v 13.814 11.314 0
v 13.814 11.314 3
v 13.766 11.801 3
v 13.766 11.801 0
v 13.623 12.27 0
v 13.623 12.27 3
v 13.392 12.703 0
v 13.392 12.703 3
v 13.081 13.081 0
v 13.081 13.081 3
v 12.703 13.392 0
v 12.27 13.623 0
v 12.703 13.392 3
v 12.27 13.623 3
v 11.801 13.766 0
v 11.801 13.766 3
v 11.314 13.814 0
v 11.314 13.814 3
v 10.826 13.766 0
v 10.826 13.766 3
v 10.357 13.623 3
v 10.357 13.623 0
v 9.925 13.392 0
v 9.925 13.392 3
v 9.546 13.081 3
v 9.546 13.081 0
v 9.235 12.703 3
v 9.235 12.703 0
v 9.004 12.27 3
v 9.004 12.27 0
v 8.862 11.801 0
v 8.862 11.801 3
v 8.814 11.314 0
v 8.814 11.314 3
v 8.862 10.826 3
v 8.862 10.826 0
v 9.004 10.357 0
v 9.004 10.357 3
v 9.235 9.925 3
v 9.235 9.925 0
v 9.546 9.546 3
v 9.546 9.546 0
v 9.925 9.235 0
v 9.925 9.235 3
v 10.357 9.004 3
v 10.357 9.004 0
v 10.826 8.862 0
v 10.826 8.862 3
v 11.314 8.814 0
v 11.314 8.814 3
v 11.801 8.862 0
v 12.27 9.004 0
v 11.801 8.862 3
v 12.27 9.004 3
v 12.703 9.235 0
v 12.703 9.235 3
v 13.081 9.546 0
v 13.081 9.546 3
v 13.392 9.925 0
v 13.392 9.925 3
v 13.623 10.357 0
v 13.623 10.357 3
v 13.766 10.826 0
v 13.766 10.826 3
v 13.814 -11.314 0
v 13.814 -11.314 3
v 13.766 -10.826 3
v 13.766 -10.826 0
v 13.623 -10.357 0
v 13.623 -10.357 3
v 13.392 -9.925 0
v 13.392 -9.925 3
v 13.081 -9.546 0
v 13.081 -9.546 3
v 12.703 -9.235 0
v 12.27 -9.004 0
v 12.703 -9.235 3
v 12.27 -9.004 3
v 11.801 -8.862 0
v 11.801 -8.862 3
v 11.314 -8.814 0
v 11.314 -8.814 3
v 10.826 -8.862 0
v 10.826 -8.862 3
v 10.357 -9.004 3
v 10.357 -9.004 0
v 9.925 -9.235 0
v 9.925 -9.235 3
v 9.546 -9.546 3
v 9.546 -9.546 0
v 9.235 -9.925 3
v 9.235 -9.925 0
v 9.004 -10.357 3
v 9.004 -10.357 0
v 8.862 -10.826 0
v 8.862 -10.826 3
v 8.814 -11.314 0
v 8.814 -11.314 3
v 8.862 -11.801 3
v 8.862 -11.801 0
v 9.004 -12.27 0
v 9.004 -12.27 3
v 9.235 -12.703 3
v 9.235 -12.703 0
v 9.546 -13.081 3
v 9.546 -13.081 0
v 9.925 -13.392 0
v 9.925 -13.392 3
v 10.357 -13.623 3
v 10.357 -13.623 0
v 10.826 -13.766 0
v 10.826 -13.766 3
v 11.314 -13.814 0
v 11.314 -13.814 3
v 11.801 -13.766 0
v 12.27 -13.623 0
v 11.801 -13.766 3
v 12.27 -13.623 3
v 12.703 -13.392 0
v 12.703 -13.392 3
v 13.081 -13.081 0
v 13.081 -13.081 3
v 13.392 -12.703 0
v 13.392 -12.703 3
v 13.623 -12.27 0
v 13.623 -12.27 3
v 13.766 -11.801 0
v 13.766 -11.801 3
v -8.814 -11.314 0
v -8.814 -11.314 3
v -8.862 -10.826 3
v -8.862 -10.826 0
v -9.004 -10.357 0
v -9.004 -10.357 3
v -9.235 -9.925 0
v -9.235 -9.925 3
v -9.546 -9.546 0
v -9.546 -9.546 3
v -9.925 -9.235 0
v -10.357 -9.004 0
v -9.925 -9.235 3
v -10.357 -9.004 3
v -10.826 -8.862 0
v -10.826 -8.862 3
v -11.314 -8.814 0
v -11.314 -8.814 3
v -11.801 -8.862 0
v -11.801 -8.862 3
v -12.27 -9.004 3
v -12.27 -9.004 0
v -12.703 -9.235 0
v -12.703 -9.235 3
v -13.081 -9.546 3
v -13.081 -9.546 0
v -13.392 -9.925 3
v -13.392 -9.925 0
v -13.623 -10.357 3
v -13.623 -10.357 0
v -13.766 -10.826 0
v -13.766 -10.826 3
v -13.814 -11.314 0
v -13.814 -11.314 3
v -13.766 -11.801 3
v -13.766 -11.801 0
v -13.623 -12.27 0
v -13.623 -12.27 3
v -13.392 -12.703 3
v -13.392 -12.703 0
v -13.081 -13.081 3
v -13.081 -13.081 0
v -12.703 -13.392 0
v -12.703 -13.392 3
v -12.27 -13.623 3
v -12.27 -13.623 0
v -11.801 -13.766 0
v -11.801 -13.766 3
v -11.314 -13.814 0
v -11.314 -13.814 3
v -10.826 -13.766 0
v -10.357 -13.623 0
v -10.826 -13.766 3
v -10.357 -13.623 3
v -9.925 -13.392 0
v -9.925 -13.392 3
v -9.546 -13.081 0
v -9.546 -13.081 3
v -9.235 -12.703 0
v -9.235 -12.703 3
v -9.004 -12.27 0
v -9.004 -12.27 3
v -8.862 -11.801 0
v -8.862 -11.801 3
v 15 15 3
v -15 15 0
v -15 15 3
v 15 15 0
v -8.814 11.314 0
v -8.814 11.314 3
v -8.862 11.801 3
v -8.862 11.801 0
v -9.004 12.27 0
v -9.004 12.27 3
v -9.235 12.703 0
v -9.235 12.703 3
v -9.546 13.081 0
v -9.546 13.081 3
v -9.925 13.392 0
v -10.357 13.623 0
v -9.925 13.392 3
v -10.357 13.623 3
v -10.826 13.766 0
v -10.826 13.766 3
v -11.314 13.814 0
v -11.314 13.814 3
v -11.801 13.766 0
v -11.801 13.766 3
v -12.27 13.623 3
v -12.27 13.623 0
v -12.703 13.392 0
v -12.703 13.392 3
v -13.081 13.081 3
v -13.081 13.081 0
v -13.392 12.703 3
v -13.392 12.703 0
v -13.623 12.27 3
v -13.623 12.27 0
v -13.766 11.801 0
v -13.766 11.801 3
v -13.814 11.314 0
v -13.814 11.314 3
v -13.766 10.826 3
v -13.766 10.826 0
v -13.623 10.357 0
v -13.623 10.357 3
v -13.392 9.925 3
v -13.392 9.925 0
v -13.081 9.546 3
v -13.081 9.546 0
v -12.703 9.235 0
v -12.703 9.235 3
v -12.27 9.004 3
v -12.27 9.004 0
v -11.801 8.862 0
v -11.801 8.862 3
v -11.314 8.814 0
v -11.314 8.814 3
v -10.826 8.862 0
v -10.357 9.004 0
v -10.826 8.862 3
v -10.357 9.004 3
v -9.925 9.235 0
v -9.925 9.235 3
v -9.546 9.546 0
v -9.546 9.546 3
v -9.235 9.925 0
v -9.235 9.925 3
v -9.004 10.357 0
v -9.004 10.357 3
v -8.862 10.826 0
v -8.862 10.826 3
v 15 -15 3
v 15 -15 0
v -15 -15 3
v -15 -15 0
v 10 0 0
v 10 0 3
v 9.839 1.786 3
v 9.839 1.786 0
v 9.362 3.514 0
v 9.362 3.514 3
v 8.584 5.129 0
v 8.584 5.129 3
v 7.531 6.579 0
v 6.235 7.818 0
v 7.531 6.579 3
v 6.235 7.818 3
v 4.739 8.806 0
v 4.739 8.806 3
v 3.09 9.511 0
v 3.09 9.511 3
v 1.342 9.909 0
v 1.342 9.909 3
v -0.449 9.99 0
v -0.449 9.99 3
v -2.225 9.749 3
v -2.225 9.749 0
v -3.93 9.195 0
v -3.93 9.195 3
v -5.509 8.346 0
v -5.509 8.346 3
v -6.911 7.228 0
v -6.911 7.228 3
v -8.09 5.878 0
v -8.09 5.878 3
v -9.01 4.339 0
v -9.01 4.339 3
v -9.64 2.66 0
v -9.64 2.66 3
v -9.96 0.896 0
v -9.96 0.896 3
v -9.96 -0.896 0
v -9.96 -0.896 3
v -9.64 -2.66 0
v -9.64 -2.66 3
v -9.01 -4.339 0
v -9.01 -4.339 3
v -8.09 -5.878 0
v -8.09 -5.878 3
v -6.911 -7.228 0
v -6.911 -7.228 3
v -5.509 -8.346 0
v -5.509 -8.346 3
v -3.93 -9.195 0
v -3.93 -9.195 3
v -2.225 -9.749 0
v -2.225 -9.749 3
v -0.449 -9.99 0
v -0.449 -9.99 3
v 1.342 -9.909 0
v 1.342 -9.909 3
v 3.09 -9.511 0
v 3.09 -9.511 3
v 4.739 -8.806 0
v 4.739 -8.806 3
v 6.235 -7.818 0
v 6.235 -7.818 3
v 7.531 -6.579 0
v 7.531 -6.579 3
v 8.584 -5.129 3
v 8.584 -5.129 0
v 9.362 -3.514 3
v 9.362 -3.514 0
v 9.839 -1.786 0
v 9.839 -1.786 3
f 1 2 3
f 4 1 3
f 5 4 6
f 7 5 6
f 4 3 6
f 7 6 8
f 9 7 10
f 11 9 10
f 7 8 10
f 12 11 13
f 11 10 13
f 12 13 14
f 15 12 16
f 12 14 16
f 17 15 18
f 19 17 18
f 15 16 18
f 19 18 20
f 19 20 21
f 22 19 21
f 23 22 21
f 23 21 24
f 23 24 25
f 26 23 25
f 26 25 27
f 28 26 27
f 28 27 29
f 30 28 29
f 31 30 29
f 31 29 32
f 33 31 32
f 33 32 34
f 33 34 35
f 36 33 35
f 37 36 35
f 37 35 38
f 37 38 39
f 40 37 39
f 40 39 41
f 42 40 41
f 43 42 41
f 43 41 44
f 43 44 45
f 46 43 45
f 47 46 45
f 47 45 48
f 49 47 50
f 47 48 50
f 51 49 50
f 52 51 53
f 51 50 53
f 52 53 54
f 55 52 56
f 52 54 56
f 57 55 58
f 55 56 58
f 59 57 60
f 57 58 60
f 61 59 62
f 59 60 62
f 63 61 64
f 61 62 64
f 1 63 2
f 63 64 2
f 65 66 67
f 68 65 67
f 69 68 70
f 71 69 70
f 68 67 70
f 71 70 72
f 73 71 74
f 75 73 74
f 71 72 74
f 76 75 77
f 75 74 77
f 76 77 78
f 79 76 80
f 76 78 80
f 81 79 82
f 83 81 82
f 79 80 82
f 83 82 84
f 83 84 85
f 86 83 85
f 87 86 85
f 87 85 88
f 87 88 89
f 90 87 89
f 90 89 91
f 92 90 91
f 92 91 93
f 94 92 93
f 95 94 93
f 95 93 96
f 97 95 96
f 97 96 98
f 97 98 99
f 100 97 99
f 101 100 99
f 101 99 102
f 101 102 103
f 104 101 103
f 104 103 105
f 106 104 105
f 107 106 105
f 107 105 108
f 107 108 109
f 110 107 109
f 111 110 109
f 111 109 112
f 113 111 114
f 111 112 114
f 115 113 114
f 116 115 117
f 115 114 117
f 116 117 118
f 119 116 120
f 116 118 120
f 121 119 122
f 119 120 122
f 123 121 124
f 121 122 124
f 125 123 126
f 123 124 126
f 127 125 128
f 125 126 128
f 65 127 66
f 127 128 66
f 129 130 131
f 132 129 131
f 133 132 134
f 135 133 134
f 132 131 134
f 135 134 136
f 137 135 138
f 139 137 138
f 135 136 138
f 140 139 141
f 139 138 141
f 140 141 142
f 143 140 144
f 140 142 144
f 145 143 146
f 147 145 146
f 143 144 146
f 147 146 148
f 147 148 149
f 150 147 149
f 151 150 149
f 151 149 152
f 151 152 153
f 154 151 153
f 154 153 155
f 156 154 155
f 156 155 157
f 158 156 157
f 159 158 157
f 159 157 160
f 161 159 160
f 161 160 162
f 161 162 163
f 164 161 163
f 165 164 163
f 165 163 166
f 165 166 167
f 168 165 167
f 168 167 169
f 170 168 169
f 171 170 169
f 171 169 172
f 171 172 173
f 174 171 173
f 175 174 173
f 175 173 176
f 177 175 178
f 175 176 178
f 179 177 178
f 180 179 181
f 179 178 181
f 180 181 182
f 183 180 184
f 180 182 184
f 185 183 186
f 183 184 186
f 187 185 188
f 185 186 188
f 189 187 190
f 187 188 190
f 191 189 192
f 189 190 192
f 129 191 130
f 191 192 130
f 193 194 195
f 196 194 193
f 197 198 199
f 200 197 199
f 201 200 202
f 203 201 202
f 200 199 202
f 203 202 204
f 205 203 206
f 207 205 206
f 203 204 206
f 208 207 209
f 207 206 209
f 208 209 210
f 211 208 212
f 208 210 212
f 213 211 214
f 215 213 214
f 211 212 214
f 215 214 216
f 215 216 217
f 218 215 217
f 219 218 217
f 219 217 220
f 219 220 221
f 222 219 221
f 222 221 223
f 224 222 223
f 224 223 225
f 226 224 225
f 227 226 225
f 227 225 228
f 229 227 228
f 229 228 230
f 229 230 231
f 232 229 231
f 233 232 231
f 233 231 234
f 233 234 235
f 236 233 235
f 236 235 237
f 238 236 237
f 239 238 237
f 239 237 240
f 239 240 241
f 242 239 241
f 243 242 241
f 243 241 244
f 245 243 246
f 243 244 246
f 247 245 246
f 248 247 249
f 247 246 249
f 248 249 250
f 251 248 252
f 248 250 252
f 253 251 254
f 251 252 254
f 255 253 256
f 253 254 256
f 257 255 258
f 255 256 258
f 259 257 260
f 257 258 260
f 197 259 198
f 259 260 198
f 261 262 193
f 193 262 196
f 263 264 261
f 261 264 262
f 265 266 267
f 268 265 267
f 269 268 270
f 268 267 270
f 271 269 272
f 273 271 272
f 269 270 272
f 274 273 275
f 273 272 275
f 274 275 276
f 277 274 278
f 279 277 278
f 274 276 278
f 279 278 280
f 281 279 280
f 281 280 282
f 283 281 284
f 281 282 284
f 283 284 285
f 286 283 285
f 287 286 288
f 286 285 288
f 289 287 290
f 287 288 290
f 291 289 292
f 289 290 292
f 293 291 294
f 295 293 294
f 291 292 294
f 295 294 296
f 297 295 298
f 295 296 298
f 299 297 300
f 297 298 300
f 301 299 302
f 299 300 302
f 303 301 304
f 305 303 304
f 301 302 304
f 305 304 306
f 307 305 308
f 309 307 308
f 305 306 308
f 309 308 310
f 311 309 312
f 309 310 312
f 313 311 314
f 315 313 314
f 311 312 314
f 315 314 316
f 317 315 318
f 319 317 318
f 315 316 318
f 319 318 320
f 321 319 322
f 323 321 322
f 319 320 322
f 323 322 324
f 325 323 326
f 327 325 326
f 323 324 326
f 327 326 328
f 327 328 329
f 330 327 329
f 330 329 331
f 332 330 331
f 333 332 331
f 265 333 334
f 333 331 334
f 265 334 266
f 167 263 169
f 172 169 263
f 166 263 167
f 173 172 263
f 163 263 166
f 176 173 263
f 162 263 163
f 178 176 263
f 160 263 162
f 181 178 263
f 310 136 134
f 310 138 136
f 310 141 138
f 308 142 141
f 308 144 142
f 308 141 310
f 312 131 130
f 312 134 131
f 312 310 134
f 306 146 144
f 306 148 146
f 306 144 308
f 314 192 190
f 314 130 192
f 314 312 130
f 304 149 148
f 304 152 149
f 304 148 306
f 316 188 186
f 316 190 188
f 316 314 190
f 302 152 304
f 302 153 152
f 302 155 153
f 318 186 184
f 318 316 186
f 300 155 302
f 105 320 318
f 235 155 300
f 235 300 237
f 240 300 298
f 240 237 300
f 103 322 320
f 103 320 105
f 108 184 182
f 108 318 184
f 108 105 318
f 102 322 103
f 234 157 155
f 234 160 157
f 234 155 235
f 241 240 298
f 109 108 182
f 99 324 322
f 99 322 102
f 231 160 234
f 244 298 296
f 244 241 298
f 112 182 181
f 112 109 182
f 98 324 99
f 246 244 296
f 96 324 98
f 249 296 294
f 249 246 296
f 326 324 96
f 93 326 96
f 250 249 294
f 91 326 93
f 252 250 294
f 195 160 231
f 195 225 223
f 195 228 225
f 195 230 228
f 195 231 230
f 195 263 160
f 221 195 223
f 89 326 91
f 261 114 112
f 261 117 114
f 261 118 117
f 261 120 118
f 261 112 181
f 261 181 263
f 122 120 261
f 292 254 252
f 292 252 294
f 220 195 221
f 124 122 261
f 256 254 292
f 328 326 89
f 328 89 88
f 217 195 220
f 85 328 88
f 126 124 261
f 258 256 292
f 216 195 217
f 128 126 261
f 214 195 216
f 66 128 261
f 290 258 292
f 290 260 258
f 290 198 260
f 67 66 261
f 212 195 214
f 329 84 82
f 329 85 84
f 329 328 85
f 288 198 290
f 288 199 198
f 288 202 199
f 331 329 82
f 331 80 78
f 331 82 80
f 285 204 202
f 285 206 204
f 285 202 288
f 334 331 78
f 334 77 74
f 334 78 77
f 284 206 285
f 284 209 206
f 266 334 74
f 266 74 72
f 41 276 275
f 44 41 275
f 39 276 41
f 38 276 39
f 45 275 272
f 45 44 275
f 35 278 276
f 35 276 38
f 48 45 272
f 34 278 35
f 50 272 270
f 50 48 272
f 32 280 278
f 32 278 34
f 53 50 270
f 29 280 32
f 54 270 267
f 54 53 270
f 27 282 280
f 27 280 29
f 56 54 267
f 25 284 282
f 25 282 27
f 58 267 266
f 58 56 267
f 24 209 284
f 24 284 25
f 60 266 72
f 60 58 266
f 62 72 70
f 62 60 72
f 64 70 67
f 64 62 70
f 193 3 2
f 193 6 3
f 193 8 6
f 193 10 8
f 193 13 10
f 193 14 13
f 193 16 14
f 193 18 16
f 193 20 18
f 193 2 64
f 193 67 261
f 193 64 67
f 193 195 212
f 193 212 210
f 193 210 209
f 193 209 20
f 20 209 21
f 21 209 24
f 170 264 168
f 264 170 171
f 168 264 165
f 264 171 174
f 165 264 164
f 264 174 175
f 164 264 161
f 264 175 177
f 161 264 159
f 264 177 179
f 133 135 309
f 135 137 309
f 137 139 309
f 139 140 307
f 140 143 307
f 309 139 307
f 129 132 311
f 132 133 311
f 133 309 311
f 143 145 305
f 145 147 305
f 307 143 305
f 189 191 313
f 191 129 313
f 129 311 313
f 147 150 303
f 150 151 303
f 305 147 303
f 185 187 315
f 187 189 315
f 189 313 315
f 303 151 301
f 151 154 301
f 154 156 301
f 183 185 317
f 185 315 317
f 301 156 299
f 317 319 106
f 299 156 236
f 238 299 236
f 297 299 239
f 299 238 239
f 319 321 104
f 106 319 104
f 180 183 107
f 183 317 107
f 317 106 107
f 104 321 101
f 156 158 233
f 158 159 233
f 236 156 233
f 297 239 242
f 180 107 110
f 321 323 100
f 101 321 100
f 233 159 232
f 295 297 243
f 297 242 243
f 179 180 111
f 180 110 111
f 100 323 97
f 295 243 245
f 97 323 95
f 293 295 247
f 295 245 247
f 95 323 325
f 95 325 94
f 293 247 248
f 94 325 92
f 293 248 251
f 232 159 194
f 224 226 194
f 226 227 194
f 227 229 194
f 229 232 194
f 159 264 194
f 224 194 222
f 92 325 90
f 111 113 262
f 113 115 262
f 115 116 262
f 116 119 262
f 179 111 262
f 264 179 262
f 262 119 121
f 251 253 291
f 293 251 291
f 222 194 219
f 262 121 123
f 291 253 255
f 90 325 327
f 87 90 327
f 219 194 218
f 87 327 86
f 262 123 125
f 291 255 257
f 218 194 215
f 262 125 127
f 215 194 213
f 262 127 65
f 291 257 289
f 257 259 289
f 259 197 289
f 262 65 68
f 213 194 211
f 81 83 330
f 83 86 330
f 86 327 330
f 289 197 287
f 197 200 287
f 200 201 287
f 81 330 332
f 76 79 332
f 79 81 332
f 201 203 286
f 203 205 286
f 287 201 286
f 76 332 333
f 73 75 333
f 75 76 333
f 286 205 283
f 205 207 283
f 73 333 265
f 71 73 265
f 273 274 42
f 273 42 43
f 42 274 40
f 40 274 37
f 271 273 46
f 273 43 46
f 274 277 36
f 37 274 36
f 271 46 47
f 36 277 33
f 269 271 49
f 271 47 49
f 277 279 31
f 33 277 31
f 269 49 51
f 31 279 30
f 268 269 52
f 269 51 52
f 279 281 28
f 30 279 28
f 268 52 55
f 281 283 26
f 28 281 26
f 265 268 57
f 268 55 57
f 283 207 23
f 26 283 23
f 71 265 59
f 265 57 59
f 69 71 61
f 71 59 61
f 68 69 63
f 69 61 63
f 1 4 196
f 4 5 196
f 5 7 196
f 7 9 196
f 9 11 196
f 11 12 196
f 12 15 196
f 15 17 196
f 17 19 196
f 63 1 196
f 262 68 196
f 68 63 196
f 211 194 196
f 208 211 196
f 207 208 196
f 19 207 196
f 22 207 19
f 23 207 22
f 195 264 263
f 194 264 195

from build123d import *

# Parameters (mm, degrees)
SKETCH1_W           = 30
SKETCH1_H           = 30
BOSS_EXTRUDE1_DEPTH = 3
SKETCH2_R           = 10
CUT_EXTRUDE1_DEPTH  = 3
SKETCH3_R           = 2.5
CUT_EXTRUDE2_DEPTH  = 10


with BuildPart() as part:
    # Sketch1 → Boss-Extrude1 (new body)
    with BuildSketch(Plane.XY):
        Rectangle(SKETCH1_W, SKETCH1_H)
    extrude(amount=BOSS_EXTRUDE1_DEPTH)

    # Sketch2 → Cut-Extrude1 (cut)
    with BuildSketch(Plane.XY.offset(3)):
        Circle(SKETCH2_R)
    extrude(amount=-CUT_EXTRUDE1_DEPTH, mode=Mode.SUBTRACT)

    # Sketch3 → Cut-Extrude2 (cut)
    with BuildSketch(Plane.XY.offset(3)):
        with Locations((-11.313708499, 11.313708499)):
            Circle(SKETCH3_R)
        with Locations((11.313708499, 11.313708499)):
            Circle(SKETCH3_R)
        with Locations((11.313708499, -11.313708499)):
            Circle(SKETCH3_R)
        with Locations((-11.313708499, -11.313708499)):
            Circle(SKETCH3_R)
    extrude(amount=-CUT_EXTRUDE2_DEPTH, mode=Mode.SUBTRACT)


solid = part.part
